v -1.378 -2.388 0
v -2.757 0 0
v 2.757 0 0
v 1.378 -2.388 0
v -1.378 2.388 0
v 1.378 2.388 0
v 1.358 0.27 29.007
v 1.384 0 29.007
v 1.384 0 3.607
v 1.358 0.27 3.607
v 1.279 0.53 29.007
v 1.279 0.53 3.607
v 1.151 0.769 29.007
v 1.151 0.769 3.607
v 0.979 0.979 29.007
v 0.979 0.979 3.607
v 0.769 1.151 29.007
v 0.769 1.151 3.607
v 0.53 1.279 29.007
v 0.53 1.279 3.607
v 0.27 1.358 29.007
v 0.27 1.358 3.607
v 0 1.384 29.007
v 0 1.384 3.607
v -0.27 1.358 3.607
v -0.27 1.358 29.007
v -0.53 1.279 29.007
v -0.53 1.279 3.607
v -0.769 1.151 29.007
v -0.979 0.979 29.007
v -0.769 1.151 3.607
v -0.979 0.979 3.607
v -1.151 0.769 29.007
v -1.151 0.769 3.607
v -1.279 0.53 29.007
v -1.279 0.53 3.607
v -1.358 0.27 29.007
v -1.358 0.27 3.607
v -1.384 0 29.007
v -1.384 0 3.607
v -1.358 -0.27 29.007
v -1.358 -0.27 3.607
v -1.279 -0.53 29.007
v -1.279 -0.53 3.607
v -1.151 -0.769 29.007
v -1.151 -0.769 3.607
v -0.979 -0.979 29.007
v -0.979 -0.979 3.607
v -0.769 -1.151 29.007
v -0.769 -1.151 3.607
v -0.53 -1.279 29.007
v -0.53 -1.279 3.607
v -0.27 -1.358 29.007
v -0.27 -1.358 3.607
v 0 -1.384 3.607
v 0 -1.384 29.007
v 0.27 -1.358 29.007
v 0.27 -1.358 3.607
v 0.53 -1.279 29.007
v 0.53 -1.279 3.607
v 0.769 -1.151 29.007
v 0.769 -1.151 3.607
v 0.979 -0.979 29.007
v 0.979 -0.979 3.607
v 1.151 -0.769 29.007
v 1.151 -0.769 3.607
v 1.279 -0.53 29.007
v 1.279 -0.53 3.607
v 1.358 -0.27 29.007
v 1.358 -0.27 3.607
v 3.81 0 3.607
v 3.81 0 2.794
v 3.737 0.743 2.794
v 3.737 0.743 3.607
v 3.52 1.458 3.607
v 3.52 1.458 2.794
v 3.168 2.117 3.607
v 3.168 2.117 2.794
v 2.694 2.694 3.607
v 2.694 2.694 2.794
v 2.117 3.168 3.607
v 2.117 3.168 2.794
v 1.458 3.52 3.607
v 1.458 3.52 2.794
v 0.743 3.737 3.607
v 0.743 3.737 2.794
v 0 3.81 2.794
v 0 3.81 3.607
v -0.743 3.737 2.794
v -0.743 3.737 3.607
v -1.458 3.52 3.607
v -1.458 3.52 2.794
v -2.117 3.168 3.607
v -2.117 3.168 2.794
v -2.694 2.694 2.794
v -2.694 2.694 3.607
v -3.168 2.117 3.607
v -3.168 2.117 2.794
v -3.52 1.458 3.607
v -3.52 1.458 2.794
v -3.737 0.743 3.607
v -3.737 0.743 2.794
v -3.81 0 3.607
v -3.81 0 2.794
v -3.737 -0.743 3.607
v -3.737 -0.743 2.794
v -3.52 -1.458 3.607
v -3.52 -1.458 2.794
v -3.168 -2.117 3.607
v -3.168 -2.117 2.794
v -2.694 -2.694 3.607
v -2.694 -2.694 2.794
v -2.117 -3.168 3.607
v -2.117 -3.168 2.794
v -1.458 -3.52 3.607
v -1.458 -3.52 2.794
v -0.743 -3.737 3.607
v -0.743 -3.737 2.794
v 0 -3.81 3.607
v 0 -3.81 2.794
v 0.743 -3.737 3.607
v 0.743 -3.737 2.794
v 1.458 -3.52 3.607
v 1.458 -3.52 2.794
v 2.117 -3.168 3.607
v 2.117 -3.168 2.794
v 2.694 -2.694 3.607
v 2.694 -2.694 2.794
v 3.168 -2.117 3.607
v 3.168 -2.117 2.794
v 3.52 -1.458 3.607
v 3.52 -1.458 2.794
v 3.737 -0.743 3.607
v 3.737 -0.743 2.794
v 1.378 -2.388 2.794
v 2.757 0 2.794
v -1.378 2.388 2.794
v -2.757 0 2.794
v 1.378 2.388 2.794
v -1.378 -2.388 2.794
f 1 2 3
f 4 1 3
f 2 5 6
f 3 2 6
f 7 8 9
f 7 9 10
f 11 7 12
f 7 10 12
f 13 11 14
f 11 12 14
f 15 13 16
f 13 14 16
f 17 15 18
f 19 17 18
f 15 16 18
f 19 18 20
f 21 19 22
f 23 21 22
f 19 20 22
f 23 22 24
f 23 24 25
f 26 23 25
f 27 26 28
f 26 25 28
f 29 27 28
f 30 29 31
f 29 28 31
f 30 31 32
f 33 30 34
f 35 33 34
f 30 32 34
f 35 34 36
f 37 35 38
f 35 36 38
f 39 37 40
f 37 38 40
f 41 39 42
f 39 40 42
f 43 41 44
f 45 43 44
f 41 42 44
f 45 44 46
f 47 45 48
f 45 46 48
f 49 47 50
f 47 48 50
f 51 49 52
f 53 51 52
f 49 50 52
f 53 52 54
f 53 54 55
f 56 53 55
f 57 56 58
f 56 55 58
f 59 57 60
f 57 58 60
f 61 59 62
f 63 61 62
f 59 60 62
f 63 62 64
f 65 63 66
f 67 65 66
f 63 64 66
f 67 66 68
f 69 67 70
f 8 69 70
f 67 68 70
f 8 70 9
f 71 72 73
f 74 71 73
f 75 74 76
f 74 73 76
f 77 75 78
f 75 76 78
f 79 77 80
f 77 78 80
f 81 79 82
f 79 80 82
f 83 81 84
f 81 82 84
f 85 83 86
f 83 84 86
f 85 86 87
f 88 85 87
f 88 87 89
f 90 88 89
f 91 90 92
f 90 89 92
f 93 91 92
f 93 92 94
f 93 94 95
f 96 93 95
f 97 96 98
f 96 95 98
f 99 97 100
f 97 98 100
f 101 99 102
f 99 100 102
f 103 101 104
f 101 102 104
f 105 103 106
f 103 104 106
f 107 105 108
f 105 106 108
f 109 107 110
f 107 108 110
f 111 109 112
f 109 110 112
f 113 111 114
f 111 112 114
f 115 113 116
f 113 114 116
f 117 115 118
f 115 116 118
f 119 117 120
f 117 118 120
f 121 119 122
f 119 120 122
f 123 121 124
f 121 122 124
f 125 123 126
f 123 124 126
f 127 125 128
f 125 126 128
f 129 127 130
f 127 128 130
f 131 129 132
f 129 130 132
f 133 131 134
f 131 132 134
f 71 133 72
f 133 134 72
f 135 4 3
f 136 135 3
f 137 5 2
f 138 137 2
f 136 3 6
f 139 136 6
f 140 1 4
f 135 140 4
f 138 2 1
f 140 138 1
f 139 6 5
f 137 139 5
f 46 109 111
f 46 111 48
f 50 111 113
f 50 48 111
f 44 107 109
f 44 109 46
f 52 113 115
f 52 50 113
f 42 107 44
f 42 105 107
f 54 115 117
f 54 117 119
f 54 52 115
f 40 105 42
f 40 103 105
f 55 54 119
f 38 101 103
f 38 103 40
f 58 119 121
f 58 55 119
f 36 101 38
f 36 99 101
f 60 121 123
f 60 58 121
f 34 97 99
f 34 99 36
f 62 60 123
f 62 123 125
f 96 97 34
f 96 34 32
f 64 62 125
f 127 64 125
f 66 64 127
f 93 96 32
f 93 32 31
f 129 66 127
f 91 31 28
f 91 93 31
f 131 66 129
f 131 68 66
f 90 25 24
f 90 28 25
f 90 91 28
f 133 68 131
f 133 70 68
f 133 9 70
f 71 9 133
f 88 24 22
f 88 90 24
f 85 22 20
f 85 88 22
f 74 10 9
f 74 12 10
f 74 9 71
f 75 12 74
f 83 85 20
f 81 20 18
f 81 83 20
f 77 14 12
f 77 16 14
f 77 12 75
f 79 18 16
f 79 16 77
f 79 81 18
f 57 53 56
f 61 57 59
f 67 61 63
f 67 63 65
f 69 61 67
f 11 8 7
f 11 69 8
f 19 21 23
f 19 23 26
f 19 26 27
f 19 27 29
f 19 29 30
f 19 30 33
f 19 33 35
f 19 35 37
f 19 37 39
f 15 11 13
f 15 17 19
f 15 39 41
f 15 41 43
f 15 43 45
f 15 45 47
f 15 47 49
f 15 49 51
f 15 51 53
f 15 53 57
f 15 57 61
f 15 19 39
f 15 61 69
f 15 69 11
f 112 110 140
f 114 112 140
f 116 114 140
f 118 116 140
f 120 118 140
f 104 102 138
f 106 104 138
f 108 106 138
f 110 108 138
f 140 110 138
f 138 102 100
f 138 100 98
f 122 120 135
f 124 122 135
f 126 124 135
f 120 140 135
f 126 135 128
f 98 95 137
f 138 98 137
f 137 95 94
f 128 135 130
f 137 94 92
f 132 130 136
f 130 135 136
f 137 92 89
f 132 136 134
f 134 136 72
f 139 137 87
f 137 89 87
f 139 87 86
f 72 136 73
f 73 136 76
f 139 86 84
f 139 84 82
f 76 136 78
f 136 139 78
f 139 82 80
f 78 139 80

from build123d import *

# Parameters (mm, degrees)
BOSS_EXTRUDE1_DEPTH = 2.794
SKETCH2_R           = 3.81
BOSS_EXTRUDE2_DEPTH = 0.8128
SKETCH3_R           = 1.3843
BOSS_EXTRUDE3_DEPTH = 25.4


with BuildPart() as part:
    # Sketch1 → Boss-Extrude1 (new body)
    with BuildSketch(Plane.XY):
        Polygon((2.756963005, 0), (1.378481503, 2.3876), (-1.378481503, 2.3876), (-2.756963005, 0), (-1.378481503, -2.3876), (1.378481503, -2.3876), align=None)
    extrude(amount=BOSS_EXTRUDE1_DEPTH)

    # Sketch2 → Boss-Extrude2 (add)
    with BuildSketch(Plane.XY.offset(2.794)):
        Circle(SKETCH2_R)
    extrude(amount=BOSS_EXTRUDE2_DEPTH)

    # Sketch3 → Boss-Extrude3 (add)
    with BuildSketch(Plane.XY.offset(3.6068)):
        Circle(SKETCH3_R)
    extrude(amount=BOSS_EXTRUDE3_DEPTH)


solid = part.part
